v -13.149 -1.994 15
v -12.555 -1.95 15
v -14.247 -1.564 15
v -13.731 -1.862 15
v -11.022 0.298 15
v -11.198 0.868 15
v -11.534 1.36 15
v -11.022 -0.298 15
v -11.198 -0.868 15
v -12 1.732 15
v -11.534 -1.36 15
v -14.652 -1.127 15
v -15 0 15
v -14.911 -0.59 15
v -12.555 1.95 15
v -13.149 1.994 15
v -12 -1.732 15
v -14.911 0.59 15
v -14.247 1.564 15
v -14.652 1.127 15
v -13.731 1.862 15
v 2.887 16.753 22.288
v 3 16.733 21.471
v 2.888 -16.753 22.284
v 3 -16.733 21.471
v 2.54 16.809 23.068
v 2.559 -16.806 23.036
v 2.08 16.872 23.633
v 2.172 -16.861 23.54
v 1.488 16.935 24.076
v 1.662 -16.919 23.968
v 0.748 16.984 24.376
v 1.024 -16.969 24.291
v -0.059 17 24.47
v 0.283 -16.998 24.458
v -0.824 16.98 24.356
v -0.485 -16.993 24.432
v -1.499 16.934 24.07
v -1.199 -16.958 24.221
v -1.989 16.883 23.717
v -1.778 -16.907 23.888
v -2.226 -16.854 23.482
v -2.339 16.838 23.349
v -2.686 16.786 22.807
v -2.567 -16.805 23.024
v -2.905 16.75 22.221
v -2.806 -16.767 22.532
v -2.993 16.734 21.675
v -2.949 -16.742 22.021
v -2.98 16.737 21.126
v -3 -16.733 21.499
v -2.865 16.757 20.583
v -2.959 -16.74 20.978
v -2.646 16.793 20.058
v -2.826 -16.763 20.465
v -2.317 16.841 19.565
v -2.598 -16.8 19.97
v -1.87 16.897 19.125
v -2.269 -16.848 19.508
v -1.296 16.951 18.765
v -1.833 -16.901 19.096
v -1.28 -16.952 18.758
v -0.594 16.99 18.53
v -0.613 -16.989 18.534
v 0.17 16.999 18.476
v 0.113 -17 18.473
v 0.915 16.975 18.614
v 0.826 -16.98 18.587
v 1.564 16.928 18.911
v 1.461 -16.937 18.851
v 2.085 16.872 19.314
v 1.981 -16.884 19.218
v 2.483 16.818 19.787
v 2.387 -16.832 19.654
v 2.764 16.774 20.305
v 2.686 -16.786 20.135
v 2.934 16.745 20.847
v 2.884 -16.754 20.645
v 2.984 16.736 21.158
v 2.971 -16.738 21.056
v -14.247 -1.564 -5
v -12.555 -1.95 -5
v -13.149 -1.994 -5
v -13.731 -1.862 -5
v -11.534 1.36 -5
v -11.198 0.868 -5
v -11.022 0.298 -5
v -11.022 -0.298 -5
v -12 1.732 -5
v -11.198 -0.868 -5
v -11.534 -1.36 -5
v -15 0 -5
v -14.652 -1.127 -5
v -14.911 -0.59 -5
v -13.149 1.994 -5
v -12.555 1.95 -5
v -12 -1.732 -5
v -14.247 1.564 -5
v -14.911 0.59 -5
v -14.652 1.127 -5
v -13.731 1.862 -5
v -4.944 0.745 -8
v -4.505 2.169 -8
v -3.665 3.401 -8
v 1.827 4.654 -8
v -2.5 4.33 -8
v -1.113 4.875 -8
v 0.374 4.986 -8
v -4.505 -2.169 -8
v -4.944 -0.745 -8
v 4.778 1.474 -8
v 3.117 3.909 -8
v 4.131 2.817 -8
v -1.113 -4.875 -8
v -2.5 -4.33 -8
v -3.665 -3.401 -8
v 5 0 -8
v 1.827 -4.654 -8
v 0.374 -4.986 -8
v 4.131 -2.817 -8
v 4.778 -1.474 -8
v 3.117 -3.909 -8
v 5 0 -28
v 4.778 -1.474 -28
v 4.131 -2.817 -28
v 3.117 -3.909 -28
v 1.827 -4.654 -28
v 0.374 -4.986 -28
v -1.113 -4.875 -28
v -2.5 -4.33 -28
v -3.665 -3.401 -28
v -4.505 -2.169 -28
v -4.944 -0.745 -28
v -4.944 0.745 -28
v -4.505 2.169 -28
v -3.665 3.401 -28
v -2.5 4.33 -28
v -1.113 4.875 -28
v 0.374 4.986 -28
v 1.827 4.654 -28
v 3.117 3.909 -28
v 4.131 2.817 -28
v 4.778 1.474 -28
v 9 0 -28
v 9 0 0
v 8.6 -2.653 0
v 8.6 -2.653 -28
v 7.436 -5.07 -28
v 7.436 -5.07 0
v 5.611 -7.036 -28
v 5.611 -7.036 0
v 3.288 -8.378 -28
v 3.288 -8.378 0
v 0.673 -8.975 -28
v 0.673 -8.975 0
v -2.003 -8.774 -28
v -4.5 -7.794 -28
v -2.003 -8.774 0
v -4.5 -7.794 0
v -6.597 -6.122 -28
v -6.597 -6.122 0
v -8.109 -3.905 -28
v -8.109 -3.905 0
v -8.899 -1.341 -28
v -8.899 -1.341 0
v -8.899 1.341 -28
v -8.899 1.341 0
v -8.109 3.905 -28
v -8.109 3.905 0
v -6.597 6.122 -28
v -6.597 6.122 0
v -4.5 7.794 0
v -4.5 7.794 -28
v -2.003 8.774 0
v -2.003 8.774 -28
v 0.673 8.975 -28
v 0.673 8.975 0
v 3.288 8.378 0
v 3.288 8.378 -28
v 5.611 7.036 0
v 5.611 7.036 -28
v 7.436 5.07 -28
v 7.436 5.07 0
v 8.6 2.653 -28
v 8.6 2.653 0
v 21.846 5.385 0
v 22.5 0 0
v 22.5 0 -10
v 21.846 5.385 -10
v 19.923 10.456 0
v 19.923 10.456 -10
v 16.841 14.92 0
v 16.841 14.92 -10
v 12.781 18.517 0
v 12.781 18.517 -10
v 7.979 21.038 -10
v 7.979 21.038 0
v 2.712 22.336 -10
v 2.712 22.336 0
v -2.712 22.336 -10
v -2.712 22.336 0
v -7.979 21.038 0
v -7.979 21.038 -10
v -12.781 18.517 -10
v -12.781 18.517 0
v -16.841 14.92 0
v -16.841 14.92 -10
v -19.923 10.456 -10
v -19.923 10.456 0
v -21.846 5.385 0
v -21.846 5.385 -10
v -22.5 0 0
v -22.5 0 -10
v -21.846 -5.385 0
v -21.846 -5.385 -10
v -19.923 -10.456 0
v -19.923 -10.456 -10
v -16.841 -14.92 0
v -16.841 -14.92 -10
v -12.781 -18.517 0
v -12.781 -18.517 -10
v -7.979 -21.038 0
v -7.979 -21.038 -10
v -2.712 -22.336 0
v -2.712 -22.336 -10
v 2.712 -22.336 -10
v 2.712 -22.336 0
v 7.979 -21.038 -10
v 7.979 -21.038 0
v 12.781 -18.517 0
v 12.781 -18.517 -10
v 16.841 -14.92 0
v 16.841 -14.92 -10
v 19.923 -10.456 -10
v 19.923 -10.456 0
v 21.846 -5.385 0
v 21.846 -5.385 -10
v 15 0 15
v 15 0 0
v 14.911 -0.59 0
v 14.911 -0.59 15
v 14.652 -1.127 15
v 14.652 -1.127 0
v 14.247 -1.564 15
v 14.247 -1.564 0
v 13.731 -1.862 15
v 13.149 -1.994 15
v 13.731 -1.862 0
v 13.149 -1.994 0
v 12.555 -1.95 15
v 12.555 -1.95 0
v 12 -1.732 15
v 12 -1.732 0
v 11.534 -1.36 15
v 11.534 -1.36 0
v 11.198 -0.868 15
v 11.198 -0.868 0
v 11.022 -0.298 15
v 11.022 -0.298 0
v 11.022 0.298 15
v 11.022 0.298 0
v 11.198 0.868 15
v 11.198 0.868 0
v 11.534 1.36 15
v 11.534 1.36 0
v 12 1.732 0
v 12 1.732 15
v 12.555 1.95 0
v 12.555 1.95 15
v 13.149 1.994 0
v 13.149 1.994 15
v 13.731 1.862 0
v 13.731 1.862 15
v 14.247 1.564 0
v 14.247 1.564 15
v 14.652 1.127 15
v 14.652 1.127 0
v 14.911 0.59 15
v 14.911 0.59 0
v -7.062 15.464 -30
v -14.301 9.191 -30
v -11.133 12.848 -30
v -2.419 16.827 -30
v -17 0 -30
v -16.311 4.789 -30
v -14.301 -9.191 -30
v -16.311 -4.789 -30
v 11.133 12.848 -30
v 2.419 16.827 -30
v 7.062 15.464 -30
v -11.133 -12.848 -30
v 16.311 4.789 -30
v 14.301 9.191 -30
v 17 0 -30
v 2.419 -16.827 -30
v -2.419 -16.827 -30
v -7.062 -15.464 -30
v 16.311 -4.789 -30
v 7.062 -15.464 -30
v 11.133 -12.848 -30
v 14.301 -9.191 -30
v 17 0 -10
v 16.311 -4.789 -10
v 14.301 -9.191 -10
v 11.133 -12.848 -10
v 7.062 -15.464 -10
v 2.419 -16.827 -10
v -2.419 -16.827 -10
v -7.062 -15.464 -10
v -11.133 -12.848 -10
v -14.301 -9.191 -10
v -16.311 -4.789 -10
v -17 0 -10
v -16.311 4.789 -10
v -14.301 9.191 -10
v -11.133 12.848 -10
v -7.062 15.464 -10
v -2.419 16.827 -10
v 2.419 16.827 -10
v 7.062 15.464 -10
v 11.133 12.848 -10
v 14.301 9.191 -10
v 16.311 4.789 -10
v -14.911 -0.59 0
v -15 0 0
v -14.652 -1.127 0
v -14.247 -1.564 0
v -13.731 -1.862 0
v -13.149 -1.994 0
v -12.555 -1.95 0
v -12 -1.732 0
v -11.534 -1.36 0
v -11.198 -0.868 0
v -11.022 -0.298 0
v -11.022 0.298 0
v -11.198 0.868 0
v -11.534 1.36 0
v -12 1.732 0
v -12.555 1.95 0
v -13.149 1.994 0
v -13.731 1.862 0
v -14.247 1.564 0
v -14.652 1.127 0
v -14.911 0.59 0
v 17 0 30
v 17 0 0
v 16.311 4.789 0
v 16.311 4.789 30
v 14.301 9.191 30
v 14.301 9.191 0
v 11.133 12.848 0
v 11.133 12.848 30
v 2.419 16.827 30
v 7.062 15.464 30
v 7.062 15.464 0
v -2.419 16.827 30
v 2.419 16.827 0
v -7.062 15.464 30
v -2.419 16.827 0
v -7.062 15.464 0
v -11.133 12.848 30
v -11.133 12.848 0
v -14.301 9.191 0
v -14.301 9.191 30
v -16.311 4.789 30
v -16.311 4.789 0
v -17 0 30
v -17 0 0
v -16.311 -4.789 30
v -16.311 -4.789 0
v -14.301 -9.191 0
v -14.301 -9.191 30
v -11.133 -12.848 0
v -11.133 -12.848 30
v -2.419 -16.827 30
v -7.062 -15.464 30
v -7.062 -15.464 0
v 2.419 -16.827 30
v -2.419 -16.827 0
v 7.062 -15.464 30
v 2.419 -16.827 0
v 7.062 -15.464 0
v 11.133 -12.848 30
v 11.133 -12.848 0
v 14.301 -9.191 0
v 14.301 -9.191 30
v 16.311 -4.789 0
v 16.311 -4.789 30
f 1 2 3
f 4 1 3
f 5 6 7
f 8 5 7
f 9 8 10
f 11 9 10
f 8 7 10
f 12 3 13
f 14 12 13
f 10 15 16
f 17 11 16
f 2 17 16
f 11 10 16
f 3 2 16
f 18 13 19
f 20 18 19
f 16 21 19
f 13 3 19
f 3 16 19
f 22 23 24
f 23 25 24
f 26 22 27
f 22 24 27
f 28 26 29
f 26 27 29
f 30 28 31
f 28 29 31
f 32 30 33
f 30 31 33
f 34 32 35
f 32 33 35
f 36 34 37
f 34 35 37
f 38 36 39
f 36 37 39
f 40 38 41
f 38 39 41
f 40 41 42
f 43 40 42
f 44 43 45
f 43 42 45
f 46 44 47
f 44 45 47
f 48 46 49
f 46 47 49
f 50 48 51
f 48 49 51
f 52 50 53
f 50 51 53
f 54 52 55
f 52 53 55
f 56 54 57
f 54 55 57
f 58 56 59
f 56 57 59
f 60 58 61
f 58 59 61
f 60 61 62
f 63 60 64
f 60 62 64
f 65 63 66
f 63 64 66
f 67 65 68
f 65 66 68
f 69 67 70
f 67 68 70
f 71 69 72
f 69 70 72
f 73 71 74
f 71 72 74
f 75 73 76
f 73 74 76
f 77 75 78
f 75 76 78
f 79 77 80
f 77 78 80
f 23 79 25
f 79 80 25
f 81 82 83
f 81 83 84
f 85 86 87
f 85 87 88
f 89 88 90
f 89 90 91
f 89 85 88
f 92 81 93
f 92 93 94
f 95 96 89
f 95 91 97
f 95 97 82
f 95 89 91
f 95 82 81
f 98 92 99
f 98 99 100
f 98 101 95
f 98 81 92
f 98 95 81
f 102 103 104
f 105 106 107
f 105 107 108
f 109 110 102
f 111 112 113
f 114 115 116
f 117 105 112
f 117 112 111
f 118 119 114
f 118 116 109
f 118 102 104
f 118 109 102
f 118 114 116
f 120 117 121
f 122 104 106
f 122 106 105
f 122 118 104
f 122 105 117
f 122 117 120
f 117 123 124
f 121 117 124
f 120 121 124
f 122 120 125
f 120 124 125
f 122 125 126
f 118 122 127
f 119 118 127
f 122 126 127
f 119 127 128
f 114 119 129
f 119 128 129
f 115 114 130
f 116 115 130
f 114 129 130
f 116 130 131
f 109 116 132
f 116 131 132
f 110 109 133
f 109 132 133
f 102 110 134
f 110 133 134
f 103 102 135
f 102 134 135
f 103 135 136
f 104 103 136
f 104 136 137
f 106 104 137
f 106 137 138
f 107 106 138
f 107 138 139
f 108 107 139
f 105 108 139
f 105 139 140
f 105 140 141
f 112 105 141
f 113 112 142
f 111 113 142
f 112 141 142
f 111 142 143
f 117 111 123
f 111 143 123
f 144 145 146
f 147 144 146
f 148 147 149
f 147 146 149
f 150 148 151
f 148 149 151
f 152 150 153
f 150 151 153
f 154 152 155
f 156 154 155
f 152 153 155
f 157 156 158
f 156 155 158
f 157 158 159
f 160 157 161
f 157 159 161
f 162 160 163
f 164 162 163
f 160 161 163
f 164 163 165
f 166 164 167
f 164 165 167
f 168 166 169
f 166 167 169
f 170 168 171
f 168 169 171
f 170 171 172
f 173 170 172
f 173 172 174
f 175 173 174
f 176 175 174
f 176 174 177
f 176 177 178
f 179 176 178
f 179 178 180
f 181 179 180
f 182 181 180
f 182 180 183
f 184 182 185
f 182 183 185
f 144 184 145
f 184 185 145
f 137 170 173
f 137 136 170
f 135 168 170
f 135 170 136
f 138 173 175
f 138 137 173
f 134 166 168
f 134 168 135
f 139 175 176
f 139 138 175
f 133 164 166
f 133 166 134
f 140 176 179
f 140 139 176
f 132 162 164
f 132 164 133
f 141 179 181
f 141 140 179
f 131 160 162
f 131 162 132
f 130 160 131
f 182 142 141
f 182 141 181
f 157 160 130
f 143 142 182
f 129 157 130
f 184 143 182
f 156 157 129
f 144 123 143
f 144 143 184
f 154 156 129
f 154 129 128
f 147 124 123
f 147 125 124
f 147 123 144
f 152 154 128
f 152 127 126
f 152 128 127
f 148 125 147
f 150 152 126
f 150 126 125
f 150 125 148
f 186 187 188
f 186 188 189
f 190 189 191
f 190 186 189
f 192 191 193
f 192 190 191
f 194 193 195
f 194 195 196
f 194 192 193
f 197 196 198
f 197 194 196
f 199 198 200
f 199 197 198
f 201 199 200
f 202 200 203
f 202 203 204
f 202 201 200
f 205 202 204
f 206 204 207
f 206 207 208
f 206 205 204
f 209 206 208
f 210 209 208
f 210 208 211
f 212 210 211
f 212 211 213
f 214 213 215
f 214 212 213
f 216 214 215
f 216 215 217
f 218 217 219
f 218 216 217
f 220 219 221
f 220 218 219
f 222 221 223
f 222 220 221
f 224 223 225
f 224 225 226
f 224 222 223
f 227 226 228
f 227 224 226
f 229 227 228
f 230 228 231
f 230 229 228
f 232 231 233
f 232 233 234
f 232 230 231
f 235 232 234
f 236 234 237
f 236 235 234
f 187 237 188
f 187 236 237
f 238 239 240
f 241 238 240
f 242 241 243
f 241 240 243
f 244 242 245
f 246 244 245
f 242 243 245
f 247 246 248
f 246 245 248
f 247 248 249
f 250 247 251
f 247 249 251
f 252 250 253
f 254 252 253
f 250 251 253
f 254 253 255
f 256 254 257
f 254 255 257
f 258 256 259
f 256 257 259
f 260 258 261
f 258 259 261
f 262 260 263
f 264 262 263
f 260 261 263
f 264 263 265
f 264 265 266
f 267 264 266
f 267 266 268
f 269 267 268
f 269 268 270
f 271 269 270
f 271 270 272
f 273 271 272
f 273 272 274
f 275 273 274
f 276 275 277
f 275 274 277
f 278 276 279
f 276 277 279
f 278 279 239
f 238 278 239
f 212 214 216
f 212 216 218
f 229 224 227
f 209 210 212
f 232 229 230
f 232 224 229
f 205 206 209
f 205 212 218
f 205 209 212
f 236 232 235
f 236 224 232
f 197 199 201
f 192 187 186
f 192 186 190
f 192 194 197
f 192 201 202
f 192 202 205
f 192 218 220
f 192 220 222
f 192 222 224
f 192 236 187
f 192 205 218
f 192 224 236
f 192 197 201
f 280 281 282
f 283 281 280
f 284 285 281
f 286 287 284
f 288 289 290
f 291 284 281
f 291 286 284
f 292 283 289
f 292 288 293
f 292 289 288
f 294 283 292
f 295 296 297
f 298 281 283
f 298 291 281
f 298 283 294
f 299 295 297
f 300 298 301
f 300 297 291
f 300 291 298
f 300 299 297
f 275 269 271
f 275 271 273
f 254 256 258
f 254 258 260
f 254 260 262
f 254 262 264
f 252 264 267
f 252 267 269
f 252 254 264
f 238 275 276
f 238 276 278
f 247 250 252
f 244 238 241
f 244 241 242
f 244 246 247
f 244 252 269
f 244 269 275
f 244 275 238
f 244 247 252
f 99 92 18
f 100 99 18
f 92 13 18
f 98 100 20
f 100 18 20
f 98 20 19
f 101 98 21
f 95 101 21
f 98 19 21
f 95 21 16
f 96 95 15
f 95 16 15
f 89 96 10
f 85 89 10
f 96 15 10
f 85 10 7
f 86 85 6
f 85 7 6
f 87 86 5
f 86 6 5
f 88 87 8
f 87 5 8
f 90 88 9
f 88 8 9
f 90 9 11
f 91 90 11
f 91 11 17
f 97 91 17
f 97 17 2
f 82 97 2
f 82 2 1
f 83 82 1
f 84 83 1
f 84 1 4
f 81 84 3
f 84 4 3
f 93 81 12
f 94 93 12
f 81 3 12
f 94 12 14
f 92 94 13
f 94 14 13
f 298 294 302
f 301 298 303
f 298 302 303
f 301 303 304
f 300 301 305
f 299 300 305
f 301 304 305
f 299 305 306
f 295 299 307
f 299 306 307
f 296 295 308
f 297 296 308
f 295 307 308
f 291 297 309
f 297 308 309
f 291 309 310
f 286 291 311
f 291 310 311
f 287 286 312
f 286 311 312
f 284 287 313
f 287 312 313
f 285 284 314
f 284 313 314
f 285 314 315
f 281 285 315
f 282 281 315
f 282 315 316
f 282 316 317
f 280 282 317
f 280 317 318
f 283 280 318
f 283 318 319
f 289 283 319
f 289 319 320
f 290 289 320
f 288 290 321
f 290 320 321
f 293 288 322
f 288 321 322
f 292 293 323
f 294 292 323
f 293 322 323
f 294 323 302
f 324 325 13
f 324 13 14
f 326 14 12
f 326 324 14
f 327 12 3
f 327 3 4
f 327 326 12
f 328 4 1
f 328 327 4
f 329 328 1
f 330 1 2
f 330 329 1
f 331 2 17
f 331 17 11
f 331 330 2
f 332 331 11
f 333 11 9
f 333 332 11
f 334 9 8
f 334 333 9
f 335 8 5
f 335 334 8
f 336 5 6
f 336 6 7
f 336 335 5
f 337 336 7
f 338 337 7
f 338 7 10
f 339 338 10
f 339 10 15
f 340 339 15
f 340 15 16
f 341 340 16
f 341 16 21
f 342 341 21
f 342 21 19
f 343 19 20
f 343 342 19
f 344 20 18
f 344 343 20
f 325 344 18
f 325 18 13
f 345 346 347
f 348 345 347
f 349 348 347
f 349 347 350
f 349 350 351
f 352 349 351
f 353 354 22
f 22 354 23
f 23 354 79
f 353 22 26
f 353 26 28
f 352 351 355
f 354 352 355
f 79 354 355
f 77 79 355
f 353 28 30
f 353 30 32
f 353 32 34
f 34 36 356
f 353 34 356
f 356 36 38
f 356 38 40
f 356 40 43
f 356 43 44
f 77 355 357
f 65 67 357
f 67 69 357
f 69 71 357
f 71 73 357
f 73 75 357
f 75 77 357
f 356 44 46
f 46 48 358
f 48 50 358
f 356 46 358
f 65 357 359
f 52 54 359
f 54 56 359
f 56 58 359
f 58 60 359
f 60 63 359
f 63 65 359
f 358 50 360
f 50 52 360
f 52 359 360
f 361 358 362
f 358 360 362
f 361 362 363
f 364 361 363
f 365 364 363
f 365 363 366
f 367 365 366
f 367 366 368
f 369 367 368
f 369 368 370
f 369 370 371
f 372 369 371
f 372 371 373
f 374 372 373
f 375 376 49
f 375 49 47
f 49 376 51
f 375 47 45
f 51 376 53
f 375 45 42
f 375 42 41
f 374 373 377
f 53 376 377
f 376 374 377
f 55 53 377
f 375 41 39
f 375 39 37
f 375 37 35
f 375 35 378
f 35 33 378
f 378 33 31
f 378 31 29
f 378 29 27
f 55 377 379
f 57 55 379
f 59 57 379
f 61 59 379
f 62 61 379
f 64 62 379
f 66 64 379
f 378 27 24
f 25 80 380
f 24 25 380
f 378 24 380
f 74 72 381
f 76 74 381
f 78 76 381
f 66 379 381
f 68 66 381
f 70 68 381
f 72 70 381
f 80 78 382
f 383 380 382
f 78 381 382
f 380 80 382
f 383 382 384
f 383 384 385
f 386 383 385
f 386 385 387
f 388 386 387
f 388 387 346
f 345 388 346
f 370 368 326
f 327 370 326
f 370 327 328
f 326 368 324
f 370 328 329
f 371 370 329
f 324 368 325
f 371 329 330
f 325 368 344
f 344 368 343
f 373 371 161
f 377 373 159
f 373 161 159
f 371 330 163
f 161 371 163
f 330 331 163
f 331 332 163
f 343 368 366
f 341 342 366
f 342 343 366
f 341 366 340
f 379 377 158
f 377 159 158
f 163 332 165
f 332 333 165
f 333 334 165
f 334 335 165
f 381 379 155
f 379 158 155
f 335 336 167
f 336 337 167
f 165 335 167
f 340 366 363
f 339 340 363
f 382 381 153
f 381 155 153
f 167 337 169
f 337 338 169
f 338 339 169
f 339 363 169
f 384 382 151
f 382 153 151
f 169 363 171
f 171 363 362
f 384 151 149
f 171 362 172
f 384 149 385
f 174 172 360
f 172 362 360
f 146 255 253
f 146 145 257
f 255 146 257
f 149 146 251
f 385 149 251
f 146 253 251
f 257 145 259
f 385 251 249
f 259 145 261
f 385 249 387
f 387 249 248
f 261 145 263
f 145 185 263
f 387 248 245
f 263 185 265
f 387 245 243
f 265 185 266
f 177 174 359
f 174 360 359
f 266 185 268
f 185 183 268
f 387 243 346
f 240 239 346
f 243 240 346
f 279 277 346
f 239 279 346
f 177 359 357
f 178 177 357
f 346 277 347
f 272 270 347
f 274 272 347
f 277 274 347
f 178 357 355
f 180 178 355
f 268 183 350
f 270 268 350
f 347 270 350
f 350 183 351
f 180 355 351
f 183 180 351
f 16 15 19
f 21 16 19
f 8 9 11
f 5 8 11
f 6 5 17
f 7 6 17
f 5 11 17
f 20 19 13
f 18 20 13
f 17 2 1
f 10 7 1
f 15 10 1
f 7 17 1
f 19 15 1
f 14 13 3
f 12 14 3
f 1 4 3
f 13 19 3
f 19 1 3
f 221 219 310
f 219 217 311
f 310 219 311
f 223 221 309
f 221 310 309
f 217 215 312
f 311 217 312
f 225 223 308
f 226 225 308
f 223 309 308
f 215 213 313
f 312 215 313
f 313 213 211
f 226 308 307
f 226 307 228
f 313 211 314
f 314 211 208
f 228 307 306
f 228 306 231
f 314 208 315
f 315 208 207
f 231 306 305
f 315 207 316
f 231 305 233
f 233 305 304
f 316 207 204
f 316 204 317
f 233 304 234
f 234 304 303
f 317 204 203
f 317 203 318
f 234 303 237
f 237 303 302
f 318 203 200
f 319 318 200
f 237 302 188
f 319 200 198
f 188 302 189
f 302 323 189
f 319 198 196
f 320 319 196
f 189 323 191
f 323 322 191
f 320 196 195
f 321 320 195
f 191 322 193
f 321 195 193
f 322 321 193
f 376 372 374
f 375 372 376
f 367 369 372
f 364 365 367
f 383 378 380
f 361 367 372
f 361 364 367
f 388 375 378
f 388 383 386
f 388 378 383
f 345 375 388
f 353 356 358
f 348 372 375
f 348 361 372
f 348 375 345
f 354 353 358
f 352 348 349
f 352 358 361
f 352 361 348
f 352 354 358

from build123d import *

# Parameters (mm, degrees)
SKETCH_R             = 17
PAD_DEPTH            = 30
SKETCH001_R          = 9
PAD001_DEPTH         = 28
SKETCH002_R          = 2
POCKET_DEPTH         = 15
SKETCH006_R          = 5
POCKET001_DEPTH      = 20
SKETCH007_R          = 3
POCKET002_DEPTH      = 17.001
POCKET002_DEPTH_BACK = -17.001
SKETCH003_R          = 2
PAD002_DEPTH         = 15
PAD002_DEPTH_BACK    = 5
SKETCH004_R          = 22.5
PAD003_DEPTH         = 10
SKETCH005_R          = 17
PAD004_DEPTH         = 20


with BuildPart() as body:
    # Sketch → Pad (new body)
    with BuildSketch(Plane.XY):
        Circle(SKETCH_R)
    extrude(amount=PAD_DEPTH)

    # Sketch001 (on Face2 of Pad) → Pad001 (join)
    with BuildSketch(Plane(origin=(0, 0, 0), x_dir=(1, 0, 0), z_dir=(0, 0, -1))):
        Circle(SKETCH001_R)
    extrude(amount=PAD001_DEPTH)

    # Sketch002 (on Face2 of Pad001) → Pocket (cut)
    with BuildSketch(Plane(origin=(0, 0, 0), x_dir=(1, 0, 0), z_dir=(0, 0, -1))):
        with Locations((13, 0)):
            Circle(SKETCH002_R)
    pocket = extrude(amount=-POCKET_DEPTH, mode=Mode.SUBTRACT)

    # Mirrored: Pocket across Sketch002 V_Axis
    add(pocket.mirror(Plane(origin=(0, 0, 0), x_dir=(0, 0, -1), z_dir=(1, 0, 0))), mode=Mode.SUBTRACT)

    # Sketch006 (on Face8 of Mirrored) → Pocket001 (cut)
    with BuildSketch(Plane(origin=(0, 0, -28), x_dir=(1, 0, 0), z_dir=(0, 0, -1))):
        Circle(SKETCH006_R)
    extrude(amount=-POCKET001_DEPTH, mode=Mode.SUBTRACT)

    # Sketch007 → Pocket002 (cut, two sides)
    with BuildSketch(Plane.XZ) as pocket002_sk:
        with Locations((0, 21.470982)):
            Circle(SKETCH007_R)
    extrude(amount=-POCKET002_DEPTH, mode=Mode.SUBTRACT)
    extrude(pocket002_sk.sketch, amount=-POCKET002_DEPTH_BACK, mode=Mode.SUBTRACT)


with BuildPart() as body001:
    # Sketch003 → Pad002 (new body, two sides)
    with BuildSketch(Plane.XY) as pad002_sk:
        with Locations((13, 0)):
            Circle(SKETCH003_R)
    extrude(amount=PAD002_DEPTH)
    extrude(pad002_sk.sketch, amount=-PAD002_DEPTH_BACK)


with BuildPart() as part_mirroring:
    # Part__Mirroring: instance of Body001
    add(body001.part.mirror(Plane(origin=(0, 0, 0), x_dir=(0, -1, 0), z_dir=(1, 0, 0))))


with BuildPart() as body002:
    # Sketch004 → Pad003 (new body)
    with BuildSketch(Plane.XY):
        Circle(SKETCH004_R)
    extrude(amount=-PAD003_DEPTH)

    # Sketch005 (on Face3 of Pad003) → Pad004 (join)
    with BuildSketch(Plane(origin=(0, 0, -10), x_dir=(1, 0, 0), z_dir=(0, 0, -1))):
        Circle(SKETCH005_R)
    extrude(amount=PAD004_DEPTH)


solid = Compound([body.part, part_mirroring.part, body002.part])
